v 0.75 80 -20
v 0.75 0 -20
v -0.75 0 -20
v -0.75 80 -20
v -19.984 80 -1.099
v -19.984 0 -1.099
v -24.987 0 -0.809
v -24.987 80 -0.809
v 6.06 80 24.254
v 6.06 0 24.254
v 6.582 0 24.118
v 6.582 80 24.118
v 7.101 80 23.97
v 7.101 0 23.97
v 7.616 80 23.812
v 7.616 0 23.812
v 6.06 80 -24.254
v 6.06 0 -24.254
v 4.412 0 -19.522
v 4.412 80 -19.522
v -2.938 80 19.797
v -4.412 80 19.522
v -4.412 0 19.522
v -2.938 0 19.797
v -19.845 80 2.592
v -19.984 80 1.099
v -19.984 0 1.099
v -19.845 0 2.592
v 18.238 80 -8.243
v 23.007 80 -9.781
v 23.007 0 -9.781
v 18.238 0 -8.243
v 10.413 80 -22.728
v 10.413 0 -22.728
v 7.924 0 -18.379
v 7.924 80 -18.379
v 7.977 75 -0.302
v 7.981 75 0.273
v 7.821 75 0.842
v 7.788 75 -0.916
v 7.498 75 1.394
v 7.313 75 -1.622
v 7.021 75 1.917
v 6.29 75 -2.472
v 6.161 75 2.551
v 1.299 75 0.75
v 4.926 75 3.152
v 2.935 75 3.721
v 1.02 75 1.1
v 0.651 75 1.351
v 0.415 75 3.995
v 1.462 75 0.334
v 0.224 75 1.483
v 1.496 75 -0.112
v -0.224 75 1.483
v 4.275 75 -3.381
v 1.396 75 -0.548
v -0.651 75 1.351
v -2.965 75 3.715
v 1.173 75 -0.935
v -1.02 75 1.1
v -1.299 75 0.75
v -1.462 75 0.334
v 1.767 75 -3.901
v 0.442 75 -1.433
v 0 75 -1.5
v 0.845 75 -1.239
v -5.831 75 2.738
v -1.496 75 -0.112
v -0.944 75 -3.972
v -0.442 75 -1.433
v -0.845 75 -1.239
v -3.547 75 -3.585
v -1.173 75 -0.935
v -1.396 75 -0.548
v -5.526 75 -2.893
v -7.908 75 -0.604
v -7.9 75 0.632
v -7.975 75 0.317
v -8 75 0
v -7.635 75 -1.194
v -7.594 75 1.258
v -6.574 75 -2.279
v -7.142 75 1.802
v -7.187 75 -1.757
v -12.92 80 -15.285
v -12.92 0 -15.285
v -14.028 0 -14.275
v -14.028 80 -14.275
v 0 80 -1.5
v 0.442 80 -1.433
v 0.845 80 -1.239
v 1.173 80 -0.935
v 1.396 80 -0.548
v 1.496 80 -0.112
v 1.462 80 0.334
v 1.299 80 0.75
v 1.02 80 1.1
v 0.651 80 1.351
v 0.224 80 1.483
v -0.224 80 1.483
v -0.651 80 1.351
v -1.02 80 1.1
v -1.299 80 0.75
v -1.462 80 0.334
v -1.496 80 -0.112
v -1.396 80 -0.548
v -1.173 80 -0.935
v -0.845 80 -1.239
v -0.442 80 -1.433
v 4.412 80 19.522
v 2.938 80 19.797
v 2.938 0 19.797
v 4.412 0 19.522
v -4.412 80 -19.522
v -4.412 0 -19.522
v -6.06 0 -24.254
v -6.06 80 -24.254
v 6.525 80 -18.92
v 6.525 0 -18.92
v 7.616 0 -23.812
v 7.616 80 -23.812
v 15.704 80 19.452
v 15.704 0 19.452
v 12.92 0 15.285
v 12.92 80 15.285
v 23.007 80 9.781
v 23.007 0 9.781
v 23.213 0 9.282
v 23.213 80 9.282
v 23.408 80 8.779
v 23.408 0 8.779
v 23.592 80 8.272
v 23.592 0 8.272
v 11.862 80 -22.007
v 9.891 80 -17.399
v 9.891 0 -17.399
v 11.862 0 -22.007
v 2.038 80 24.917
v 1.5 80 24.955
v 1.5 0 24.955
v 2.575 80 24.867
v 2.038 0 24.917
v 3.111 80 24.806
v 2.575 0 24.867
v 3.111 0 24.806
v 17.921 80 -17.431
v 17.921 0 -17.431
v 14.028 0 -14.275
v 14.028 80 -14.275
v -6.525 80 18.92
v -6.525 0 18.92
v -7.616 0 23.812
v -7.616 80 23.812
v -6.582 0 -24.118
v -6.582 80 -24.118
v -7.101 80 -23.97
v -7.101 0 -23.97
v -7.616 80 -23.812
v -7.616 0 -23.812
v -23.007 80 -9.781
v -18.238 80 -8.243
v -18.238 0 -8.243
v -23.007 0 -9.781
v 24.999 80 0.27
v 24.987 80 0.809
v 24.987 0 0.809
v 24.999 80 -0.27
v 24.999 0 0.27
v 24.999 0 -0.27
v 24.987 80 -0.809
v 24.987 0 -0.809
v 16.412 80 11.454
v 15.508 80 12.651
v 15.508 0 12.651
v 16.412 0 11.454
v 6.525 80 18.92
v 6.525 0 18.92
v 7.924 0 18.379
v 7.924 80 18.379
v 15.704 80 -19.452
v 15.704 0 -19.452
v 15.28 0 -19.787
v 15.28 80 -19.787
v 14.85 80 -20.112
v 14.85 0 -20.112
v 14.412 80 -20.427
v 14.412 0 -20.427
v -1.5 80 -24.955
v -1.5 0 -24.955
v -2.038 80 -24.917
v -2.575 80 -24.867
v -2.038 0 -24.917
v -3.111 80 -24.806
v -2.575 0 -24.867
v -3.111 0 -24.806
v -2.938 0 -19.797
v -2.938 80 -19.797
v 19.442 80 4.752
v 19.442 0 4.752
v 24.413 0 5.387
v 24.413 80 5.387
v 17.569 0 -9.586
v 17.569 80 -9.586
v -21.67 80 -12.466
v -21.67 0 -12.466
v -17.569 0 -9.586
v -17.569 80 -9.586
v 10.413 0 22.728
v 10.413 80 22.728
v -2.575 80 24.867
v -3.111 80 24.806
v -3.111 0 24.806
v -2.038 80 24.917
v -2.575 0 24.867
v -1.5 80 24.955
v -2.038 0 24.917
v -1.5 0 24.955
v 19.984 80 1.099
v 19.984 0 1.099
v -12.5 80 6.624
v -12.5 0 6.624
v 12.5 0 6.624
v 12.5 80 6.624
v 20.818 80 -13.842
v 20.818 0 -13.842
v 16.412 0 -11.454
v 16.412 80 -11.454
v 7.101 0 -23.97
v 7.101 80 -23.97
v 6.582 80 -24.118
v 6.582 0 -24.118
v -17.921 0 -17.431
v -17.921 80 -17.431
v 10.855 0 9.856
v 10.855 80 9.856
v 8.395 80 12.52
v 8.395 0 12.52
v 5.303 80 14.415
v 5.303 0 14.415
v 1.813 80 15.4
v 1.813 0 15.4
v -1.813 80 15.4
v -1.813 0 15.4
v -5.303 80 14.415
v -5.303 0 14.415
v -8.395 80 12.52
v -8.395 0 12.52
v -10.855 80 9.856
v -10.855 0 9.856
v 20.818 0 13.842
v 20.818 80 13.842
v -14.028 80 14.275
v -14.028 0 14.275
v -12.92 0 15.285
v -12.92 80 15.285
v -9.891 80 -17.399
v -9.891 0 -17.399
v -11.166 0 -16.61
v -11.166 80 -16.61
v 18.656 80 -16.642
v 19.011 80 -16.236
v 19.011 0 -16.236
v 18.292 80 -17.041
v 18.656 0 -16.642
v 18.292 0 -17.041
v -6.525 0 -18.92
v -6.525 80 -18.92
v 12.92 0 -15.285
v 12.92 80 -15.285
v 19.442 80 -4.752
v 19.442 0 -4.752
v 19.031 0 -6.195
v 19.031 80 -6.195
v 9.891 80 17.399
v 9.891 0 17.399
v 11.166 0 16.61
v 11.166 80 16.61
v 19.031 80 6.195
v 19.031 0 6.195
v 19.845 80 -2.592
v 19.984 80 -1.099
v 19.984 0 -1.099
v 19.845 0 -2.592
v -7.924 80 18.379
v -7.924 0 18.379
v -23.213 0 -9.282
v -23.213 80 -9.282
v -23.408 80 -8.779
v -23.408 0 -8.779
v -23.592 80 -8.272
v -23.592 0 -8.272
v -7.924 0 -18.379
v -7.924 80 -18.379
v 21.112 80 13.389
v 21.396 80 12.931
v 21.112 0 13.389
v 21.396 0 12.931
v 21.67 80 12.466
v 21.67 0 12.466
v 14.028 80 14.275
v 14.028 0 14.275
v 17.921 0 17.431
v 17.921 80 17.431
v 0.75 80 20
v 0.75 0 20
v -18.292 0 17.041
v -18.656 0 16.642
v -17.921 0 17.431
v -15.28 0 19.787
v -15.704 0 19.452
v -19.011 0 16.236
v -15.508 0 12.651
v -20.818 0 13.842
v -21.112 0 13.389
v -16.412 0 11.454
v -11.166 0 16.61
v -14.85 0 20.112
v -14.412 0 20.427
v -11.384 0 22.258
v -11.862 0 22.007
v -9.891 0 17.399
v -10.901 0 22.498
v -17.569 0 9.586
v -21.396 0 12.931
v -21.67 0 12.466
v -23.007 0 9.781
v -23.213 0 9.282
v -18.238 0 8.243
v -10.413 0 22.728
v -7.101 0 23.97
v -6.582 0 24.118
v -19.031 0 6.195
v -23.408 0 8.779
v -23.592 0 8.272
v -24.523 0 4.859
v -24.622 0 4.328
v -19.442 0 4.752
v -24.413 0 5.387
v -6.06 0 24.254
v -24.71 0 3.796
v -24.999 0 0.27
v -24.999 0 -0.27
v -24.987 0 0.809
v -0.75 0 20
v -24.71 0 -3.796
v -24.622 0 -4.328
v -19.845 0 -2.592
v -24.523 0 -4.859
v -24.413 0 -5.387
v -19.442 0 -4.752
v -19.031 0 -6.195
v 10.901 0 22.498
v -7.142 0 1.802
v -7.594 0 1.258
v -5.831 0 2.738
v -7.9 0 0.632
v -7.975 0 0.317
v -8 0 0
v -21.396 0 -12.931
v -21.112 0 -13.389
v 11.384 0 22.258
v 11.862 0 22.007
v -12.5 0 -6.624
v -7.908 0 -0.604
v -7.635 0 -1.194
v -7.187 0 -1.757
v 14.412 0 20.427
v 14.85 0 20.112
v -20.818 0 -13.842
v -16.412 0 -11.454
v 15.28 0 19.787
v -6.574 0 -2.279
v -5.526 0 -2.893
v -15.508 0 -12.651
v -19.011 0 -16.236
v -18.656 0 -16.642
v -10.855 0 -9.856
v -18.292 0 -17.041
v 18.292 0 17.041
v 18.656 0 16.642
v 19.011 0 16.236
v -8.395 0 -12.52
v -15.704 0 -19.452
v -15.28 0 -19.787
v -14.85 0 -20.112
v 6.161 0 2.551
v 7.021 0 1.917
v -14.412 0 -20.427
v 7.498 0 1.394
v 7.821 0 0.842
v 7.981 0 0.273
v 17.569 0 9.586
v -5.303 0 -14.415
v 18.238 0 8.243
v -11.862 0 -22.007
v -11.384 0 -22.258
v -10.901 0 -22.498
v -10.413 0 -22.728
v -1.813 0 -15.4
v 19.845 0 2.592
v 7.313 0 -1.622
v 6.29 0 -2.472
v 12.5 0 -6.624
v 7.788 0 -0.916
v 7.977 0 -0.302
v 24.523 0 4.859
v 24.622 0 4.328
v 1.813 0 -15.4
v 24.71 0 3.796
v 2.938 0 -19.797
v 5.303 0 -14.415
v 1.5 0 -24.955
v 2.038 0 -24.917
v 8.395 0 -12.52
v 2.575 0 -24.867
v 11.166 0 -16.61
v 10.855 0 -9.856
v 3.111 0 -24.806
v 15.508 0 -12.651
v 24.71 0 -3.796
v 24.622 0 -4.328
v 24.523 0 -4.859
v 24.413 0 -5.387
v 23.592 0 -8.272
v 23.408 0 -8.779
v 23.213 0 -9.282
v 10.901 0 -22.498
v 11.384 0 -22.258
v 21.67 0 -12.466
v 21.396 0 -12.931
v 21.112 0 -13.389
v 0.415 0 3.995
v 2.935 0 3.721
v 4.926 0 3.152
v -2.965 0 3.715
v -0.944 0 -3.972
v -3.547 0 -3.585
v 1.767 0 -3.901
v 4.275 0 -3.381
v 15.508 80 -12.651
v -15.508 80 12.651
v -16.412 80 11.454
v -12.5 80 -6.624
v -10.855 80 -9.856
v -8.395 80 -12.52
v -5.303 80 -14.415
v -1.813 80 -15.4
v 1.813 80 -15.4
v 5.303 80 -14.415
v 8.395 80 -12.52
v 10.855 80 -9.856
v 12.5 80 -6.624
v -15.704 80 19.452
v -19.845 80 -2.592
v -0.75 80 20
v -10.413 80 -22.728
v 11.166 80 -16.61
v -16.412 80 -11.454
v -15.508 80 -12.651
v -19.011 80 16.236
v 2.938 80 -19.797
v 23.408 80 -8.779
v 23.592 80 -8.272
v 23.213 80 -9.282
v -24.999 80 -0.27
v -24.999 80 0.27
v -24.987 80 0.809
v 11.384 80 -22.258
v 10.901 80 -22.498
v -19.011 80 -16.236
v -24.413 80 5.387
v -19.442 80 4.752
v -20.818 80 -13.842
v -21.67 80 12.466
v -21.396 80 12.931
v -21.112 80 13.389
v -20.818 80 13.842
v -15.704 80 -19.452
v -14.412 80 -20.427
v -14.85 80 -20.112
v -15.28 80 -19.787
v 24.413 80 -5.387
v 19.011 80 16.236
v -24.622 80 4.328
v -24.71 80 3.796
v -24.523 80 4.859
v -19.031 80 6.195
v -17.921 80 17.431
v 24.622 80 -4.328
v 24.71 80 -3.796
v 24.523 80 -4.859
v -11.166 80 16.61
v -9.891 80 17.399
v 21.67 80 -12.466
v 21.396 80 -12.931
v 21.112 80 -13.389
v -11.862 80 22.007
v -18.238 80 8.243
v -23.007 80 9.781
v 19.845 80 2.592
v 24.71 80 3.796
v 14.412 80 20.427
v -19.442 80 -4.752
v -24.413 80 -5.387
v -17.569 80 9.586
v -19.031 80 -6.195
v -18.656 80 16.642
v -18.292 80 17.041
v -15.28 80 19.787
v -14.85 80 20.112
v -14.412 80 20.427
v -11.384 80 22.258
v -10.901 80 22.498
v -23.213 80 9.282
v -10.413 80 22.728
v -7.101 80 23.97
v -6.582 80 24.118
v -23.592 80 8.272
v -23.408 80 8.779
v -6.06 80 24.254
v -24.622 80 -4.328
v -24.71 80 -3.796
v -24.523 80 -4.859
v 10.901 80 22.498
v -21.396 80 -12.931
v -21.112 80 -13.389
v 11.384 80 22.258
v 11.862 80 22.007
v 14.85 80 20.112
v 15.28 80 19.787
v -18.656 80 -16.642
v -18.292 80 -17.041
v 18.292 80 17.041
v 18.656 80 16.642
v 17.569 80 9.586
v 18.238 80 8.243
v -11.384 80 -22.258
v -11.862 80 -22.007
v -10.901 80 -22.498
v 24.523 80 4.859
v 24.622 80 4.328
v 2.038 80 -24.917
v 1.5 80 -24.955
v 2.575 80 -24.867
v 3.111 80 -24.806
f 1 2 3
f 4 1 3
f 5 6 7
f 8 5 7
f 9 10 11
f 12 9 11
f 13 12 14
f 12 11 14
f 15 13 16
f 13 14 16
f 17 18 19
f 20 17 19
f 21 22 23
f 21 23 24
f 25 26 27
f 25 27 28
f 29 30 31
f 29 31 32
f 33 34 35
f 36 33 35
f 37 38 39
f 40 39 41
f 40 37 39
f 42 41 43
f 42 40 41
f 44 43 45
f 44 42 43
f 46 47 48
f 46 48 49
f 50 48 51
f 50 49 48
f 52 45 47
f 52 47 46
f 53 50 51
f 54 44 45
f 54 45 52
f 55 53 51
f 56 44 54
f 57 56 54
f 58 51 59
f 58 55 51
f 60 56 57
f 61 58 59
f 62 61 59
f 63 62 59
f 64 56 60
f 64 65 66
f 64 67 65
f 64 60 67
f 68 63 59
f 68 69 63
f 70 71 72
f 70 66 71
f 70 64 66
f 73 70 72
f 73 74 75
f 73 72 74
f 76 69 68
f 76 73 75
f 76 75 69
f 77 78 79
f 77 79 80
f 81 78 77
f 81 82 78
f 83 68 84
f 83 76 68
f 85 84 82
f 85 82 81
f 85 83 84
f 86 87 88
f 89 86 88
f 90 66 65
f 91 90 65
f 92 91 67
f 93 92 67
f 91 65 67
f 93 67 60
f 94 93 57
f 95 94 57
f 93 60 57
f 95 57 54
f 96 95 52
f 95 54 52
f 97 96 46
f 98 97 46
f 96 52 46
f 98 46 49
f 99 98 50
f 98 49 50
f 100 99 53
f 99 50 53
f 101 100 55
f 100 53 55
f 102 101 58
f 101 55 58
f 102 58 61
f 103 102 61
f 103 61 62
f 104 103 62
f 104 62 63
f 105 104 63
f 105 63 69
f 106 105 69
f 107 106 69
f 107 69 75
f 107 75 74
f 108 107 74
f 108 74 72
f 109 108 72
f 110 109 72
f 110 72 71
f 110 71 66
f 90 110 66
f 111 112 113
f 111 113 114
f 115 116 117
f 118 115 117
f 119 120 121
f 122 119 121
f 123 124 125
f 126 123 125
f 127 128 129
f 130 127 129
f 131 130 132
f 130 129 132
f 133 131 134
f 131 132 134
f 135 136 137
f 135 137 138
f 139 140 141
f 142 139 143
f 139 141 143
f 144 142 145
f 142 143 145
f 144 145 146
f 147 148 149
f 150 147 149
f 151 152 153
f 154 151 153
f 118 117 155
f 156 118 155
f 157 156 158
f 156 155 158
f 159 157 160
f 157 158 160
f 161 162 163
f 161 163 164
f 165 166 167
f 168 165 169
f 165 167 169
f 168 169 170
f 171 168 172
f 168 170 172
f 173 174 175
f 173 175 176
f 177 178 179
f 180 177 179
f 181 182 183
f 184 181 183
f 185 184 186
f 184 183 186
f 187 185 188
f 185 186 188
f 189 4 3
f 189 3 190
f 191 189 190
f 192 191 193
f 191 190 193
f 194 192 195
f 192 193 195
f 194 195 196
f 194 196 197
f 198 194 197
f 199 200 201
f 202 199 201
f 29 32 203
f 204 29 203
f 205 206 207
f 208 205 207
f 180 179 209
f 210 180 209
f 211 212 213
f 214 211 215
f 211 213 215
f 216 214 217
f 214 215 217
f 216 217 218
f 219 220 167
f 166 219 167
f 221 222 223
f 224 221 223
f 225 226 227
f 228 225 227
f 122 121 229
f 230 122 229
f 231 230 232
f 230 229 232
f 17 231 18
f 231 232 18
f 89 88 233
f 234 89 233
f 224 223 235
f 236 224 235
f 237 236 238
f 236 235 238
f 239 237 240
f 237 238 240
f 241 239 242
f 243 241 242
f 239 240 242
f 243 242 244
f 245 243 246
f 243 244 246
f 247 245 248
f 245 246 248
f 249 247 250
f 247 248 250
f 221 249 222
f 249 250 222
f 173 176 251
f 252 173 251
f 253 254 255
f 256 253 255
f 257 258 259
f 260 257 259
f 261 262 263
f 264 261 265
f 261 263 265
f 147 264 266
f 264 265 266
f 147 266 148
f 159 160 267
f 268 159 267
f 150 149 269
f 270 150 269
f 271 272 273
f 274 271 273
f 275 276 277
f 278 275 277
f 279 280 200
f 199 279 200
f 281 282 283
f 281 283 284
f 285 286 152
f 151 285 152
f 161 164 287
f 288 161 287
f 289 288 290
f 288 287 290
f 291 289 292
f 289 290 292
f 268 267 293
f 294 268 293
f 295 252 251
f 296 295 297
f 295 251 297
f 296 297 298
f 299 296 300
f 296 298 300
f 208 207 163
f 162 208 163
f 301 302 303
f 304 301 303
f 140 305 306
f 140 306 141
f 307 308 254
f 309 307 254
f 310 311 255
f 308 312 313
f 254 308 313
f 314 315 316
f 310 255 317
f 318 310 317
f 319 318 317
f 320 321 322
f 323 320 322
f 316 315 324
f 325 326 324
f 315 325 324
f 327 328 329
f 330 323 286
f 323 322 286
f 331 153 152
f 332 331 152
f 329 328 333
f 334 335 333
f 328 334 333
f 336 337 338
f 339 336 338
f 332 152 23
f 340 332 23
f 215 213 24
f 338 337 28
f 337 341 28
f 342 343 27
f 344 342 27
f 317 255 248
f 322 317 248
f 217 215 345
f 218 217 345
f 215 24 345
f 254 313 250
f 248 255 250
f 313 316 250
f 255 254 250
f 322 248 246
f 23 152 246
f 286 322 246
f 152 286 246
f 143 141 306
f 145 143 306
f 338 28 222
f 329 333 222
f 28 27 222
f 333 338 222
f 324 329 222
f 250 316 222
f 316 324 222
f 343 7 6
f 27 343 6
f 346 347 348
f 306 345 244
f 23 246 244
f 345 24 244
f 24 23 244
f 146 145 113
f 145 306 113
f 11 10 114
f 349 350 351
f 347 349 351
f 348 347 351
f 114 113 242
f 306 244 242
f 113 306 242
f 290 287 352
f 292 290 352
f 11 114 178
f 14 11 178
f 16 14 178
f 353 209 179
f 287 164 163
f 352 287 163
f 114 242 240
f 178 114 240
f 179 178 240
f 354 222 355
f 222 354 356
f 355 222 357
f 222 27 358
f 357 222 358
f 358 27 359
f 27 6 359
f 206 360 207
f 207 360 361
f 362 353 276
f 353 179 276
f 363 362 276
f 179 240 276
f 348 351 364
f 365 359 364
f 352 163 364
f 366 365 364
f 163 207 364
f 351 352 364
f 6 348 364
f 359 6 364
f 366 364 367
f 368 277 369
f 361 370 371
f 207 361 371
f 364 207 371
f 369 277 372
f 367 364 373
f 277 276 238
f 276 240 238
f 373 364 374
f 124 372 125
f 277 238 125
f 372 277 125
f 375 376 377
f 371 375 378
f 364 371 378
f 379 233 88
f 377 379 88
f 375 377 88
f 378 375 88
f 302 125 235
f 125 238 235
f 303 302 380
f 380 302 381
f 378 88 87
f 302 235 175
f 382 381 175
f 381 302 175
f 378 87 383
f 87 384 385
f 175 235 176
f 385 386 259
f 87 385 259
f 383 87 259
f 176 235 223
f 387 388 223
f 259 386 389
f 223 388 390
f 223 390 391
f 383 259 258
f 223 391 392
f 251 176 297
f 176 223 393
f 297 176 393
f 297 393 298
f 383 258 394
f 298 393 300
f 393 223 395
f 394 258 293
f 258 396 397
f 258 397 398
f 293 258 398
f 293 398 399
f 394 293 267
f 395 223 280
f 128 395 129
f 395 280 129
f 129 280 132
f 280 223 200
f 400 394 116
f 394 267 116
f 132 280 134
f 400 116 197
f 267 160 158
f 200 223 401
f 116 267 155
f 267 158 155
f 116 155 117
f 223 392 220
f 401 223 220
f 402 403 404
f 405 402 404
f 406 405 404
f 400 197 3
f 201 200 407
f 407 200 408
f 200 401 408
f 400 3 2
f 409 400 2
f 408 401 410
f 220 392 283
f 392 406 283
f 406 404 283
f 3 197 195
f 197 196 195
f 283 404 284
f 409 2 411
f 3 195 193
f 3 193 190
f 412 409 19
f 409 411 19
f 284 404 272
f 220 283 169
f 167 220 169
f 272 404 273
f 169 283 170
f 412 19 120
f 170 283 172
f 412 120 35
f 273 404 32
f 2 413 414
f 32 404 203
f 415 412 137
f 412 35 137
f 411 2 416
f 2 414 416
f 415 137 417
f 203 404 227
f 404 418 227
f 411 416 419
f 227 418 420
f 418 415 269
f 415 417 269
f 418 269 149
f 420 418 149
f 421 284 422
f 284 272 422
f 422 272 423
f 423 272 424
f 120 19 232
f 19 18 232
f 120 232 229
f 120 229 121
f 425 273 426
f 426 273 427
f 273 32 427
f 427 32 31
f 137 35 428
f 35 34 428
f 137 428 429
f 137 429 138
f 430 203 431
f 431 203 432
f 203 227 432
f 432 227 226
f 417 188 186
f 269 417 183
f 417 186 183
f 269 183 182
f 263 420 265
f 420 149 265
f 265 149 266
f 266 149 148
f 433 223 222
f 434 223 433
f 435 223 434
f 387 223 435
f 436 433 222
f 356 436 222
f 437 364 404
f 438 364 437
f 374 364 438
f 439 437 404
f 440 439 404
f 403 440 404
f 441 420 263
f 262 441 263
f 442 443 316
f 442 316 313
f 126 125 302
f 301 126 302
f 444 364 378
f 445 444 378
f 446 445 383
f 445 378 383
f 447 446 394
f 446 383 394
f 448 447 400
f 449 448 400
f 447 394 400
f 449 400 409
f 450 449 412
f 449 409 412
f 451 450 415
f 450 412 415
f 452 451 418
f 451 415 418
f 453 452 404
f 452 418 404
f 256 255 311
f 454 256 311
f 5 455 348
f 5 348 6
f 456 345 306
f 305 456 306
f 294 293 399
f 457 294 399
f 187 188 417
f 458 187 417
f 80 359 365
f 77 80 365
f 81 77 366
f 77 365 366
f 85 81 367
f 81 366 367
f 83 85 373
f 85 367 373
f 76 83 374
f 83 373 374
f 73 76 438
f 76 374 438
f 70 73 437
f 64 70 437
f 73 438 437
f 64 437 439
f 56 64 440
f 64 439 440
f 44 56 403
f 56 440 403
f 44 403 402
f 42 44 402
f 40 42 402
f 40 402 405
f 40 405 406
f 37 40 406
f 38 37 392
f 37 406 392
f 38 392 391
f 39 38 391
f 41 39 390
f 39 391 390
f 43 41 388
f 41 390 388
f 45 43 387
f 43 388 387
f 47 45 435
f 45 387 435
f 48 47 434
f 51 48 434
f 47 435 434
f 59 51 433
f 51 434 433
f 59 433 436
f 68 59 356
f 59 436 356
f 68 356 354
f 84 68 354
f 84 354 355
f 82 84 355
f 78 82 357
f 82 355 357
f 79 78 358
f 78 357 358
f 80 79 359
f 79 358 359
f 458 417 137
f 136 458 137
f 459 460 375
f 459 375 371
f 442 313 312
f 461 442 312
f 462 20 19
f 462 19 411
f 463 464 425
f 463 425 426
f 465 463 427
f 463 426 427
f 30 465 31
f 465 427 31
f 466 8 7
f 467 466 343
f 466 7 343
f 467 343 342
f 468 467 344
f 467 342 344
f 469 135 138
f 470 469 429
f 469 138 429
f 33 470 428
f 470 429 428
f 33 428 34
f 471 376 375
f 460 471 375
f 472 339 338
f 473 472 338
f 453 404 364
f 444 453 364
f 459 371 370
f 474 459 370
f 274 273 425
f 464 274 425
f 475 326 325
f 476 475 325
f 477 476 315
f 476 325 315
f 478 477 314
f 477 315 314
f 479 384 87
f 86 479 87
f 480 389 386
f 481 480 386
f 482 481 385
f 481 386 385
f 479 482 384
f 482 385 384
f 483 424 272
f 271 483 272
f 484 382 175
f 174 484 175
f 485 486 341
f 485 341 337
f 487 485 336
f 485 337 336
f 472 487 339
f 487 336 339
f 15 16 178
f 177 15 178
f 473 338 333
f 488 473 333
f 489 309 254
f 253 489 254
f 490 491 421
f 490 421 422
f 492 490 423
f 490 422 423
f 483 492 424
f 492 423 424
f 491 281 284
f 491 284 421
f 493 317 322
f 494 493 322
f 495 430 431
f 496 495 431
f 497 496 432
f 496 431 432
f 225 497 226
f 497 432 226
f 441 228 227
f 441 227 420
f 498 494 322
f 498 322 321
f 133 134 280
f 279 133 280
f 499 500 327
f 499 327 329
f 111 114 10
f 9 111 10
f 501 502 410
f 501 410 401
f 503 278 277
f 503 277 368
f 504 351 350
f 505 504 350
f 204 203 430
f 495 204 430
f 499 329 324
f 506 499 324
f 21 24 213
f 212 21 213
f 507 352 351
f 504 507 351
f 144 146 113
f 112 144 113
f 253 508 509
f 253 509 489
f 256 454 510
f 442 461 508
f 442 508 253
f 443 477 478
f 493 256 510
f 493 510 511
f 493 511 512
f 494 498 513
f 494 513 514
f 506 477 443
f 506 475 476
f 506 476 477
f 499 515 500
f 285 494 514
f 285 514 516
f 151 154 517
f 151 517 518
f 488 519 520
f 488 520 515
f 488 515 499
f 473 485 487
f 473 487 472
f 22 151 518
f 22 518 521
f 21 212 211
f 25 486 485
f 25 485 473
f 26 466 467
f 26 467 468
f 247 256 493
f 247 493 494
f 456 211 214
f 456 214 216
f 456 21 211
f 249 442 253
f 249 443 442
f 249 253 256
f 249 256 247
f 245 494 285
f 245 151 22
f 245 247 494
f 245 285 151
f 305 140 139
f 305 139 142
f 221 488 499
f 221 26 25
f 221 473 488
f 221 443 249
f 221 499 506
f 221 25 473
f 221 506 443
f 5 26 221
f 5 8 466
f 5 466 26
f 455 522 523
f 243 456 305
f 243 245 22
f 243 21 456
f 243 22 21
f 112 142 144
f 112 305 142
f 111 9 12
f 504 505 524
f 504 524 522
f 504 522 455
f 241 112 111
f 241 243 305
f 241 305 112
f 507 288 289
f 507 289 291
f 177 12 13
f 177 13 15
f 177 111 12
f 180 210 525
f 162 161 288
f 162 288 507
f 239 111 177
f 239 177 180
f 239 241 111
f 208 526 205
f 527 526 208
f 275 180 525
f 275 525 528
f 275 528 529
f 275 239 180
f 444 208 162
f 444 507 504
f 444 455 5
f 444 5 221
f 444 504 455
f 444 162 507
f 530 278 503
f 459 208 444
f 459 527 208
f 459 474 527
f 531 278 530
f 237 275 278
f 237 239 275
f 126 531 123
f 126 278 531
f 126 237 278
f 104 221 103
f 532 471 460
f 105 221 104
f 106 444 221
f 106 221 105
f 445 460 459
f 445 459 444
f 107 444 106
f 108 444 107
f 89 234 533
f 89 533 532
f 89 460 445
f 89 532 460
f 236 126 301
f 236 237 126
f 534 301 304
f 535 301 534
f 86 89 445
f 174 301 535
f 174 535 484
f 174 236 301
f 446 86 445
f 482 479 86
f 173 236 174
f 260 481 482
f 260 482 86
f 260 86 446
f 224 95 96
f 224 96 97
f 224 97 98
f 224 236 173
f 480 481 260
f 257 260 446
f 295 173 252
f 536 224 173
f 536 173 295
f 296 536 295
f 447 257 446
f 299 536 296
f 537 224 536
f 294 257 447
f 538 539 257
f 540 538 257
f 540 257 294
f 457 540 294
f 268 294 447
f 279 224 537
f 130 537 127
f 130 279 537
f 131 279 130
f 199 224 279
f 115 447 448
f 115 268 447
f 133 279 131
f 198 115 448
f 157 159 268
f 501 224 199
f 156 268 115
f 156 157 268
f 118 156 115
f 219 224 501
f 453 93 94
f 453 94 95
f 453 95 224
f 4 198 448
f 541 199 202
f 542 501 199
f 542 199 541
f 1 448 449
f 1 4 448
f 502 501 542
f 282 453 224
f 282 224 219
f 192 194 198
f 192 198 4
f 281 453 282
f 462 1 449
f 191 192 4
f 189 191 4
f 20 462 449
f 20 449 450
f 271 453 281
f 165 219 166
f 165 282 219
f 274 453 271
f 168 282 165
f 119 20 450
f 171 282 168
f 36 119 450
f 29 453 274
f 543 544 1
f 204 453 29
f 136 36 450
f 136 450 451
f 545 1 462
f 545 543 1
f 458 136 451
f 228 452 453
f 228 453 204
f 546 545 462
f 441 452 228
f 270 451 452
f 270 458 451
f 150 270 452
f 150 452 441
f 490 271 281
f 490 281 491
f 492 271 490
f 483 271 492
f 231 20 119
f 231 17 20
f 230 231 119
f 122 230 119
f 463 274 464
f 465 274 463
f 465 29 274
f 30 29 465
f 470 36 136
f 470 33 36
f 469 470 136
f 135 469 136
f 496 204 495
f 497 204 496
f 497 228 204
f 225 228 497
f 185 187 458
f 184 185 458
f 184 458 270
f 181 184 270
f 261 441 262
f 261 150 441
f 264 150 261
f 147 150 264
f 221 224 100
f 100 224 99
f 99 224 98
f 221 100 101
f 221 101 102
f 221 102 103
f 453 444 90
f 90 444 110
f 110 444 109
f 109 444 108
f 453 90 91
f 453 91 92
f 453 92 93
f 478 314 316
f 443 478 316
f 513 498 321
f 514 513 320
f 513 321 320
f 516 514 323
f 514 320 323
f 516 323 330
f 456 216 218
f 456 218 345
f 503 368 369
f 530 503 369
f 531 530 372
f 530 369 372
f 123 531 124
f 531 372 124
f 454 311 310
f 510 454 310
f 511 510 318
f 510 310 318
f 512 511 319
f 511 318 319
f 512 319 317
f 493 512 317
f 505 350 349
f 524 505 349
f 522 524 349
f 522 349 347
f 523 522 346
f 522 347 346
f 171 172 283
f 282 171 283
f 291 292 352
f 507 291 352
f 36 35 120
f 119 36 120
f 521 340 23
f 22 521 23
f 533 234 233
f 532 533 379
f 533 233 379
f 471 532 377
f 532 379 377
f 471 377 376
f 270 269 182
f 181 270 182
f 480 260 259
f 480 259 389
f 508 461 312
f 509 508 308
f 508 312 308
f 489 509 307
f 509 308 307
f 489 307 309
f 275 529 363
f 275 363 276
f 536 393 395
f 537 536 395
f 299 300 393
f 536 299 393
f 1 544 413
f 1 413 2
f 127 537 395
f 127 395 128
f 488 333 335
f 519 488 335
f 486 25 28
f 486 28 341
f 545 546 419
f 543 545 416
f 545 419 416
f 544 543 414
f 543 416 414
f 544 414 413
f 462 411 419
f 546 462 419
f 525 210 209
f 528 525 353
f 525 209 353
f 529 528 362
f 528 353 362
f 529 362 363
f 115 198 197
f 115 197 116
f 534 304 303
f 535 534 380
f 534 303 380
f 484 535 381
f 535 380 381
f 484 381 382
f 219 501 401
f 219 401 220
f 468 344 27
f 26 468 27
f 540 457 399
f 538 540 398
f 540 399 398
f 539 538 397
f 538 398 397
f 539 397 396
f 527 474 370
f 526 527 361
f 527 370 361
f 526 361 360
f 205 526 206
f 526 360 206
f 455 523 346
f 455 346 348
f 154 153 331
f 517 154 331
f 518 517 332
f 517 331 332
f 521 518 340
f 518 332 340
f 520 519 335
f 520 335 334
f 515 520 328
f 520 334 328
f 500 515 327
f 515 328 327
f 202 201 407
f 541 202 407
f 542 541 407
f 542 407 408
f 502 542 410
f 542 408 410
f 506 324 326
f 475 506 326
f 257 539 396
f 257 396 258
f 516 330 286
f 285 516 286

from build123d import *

# Parameters (mm, degrees)
BOSS_EXTRUDE2_DEPTH = 80
CUT_EXTRUDE3_DEPTH  = 88.451415083
SKETCH6_RX          = 8
SKETCH6_RY          = 4
CUT_EXTRUDE4_DEPTH  = 75
SKETCH7_R           = 1.5
CUT_EXTRUDE5_DEPTH  = 83.902050638


# Read off the part's stored shape, not the designer's step: Boss-Extrude2
with BuildPart() as part:
    # Boss-Extrude2 outline → Boss-Extrude2 (new body)
    with BuildSketch(Plane(origin=(0, 0, 0), x_dir=(1, 0, 0), z_dir=(0, 1, 0))):
        with BuildLine():
            Line((1.5, 24.954959427), (0.75, 20))
            Line((0.75, 20), (-0.75, 20))
            Line((-0.75, 20), (-1.5, 24.954959427))
            ThreePointArc((-1.5, 24.954959427), (-2.306708986, 24.893354407), (-3.111002112, 24.805678097))
            Line((-3.111002112, 24.805678097), (-2.937760532, 19.797274132))
            Line((-2.937760532, 19.797274132), (-4.412220181, 19.521649855))
            Line((-4.412220181, 19.521649855), (-6.059921411, 24.254429544))
            ThreePointArc((-6.059921411, 24.254429544), (-6.841574752, 24.045641079), (-7.616062779, 23.811669151))
            Line((-7.616062779, 23.811669151), (-6.525479152, 18.920375838))
            Line((-6.525479152, 18.920375838), (-7.924187496, 18.378513338))
            Line((-7.924187496, 18.378513338), (-10.413479467, 22.727944152))
            ThreePointArc((-10.413479467, 22.727944152), (-11.143458894, 22.379082284), (-11.861767562, 22.006782371))
            Line((-11.861767562, 22.006782371), (-9.890980406, 17.399166837))
            Line((-9.890980406, 17.399166837), (-11.166306109, 16.609518592))
            Line((-11.166306109, 16.609518592), (-14.412418969, 20.427485882))
            ThreePointArc((-14.412418969, 20.427485882), (-15.065865909, 19.950430682), (-15.703534077, 19.452481011))
            Line((-15.703534077, 19.452481011), (-12.919656185, 15.285450077))
            Line((-12.919656185, 15.285450077), (-14.028169561, 14.274906612))
            Line((-14.028169561, 14.274906612), (-17.920560829, 17.43139408))
            ThreePointArc((-17.920560829, 17.43139408), (-18.475222931, 16.842391091), (-19.010535574, 16.235748741))
            Line((-19.010535574, 16.235748741), (-15.508368568, 12.651205648))
            Line((-15.508368568, 12.651205648), (-16.412320523, 11.454179807))
            Line((-16.412320523, 11.454179807), (-20.818439483, 13.841697059))
            ThreePointArc((-20.818439483, 13.841697059), (-21.255428393, 13.160804072), (-21.670156083, 12.46612752))
            Line((-21.670156083, 12.46612752), (-17.56896206, 9.586139584))
            Line((-17.56896206, 9.586139584), (-18.237569594, 8.243394647))
            Line((-18.237569594, 8.243394647), (-23.00737115, 9.780637646))
            ThreePointArc((-23.00737115, 9.780637646), (-23.311805735, 9.031041655), (-23.591825416, 8.271987279))
            Line((-23.591825416, 8.271987279), (-19.031265621, 6.194629034))
            Line((-19.031265621, 6.194629034), (-19.441760106, 4.751890569))
            Line((-19.441760106, 4.751890569), (-24.412814386, 5.386510349))
            ThreePointArc((-24.412814386, 5.386510349), (-24.574327492, 4.593737945), (-24.71010343, 3.796154431))
            Line((-24.71010343, 3.796154431), (-19.845482256, 2.592167821))
            Line((-19.845482256, 2.592167821), (-19.983884795, 1.098566557))
            Line((-19.983884795, 1.098566557), (-24.986908509, 0.808951902))
            ThreePointArc((-24.986908509, 0.808951902), (-25, 0), (-24.986908509, -0.808951902))
            Line((-24.986908509, -0.808951902), (-19.983884795, -1.098566557))
            Line((-19.983884795, -1.098566557), (-19.845482256, -2.592167821))
            Line((-19.845482256, -2.592167821), (-24.71010343, -3.796154431))
            ThreePointArc((-24.71010343, -3.796154431), (-24.574327492, -4.593737945), (-24.412814386, -5.386510349))
            Line((-24.412814386, -5.386510349), (-19.441760106, -4.751890569))
            Line((-19.441760106, -4.751890569), (-19.031265621, -6.194629034))
            Line((-19.031265621, -6.194629034), (-23.591825416, -8.271987279))
            ThreePointArc((-23.591825416, -8.271987279), (-23.311805735, -9.031041655), (-23.00737115, -9.780637646))
            Line((-23.00737115, -9.780637646), (-18.237569594, -8.243394647))
            Line((-18.237569594, -8.243394647), (-17.56896206, -9.586139584))
            Line((-17.56896206, -9.586139584), (-21.670156083, -12.46612752))
            ThreePointArc((-21.670156083, -12.46612752), (-21.255428393, -13.160804072), (-20.818439483, -13.841697059))
            Line((-20.818439483, -13.841697059), (-16.412320523, -11.454179807))
            Line((-16.412320523, -11.454179807), (-15.508368568, -12.651205648))
            Line((-15.508368568, -12.651205648), (-19.010535574, -16.235748741))
            ThreePointArc((-19.010535574, -16.235748741), (-18.475222931, -16.842391091), (-17.920560829, -17.43139408))
            Line((-17.920560829, -17.43139408), (-14.028169561, -14.274906612))
            Line((-14.028169561, -14.274906612), (-12.919656185, -15.285450077))
            Line((-12.919656185, -15.285450077), (-15.703534077, -19.452481011))
            ThreePointArc((-15.703534077, -19.452481011), (-15.065865909, -19.950430682), (-14.412418969, -20.427485882))
            Line((-14.412418969, -20.427485882), (-11.166306109, -16.609518592))
            Line((-11.166306109, -16.609518592), (-9.890980406, -17.399166837))
            Line((-9.890980406, -17.399166837), (-11.861767562, -22.006782371))
            ThreePointArc((-11.861767562, -22.006782371), (-11.143458894, -22.379082284), (-10.413479467, -22.727944152))
            Line((-10.413479467, -22.727944152), (-7.924187496, -18.378513338))
            Line((-7.924187496, -18.378513338), (-6.525479152, -18.920375838))
            Line((-6.525479152, -18.920375838), (-7.616062779, -23.811669151))
            ThreePointArc((-7.616062779, -23.811669151), (-6.841574752, -24.045641079), (-6.059921411, -24.254429544))
            Line((-6.059921411, -24.254429544), (-4.412220181, -19.521649855))
            Line((-4.412220181, -19.521649855), (-2.937760532, -19.797274132))
            Line((-2.937760532, -19.797274132), (-3.111002112, -24.805678097))
            ThreePointArc((-3.111002112, -24.805678097), (-2.306708986, -24.893354407), (-1.5, -24.954959427))
            Line((-1.5, -24.954959427), (-0.75, -20))
            Line((-0.75, -20), (0.75, -20))
            Line((0.75, -20), (1.5, -24.954959427))
            ThreePointArc((1.5, -24.954959427), (2.306708986, -24.893354407), (3.111002112, -24.805678097))
            Line((3.111002112, -24.805678097), (2.937760532, -19.797274132))
            Line((2.937760532, -19.797274132), (4.412220181, -19.521649855))
            Line((4.412220181, -19.521649855), (6.059921411, -24.254429544))
            ThreePointArc((6.059921411, -24.254429544), (6.841574752, -24.045641079), (7.616062779, -23.811669151))
            Line((7.616062779, -23.811669151), (6.525479152, -18.920375838))
            Line((6.525479152, -18.920375838), (7.924187496, -18.378513338))
            Line((7.924187496, -18.378513338), (10.413479467, -22.727944152))
            ThreePointArc((10.413479467, -22.727944152), (11.143458894, -22.379082284), (11.861767562, -22.006782371))
            Line((11.861767562, -22.006782371), (9.890980406, -17.399166837))
            Line((9.890980406, -17.399166837), (11.166306109, -16.609518592))
            Line((11.166306109, -16.609518592), (14.412418969, -20.427485882))
            ThreePointArc((14.412418969, -20.427485882), (15.065865909, -19.950430682), (15.703534077, -19.452481011))
            Line((15.703534077, -19.452481011), (12.919656185, -15.285450077))
            Line((12.919656185, -15.285450077), (14.028169561, -14.274906612))
            Line((14.028169561, -14.274906612), (17.920560829, -17.43139408))
            ThreePointArc((17.920560829, -17.43139408), (18.475222931, -16.842391091), (19.010535574, -16.235748741))
            Line((19.010535574, -16.235748741), (15.508368568, -12.651205648))
            Line((15.508368568, -12.651205648), (16.412320523, -11.454179807))
            Line((16.412320523, -11.454179807), (20.818439483, -13.841697059))
            ThreePointArc((20.818439483, -13.841697059), (21.255428393, -13.160804072), (21.670156083, -12.46612752))
            Line((21.670156083, -12.46612752), (17.56896206, -9.586139584))
            Line((17.56896206, -9.586139584), (18.237569594, -8.243394647))
            Line((18.237569594, -8.243394647), (23.00737115, -9.780637646))
            ThreePointArc((23.00737115, -9.780637646), (23.311805735, -9.031041655), (23.591825416, -8.271987279))
            Line((23.591825416, -8.271987279), (19.031265621, -6.194629034))
            Line((19.031265621, -6.194629034), (19.441760106, -4.751890569))
            Line((19.441760106, -4.751890569), (24.412814386, -5.386510349))
            ThreePointArc((24.412814386, -5.386510349), (24.574327492, -4.593737945), (24.71010343, -3.796154431))
            Line((24.71010343, -3.796154431), (19.845482256, -2.592167821))
            Line((19.845482256, -2.592167821), (19.983884796, -1.098566557))
            Line((19.983884796, -1.098566557), (24.986908509, -0.808951902))
            ThreePointArc((24.986908509, -0.808951902), (25, 0), (24.986908509, 0.808951902))
            Line((24.986908509, 0.808951902), (19.983884796, 1.098566557))
            Line((19.983884796, 1.098566557), (19.845482256, 2.592167821))
            Line((19.845482256, 2.592167821), (24.71010343, 3.796154431))
            ThreePointArc((24.71010343, 3.796154431), (24.574327492, 4.593737945), (24.412814386, 5.386510349))
            Line((24.412814386, 5.386510349), (19.441760106, 4.751890569))
            Line((19.441760106, 4.751890569), (19.031265621, 6.194629034))
            Line((19.031265621, 6.194629034), (23.591825416, 8.271987279))
            ThreePointArc((23.591825416, 8.271987279), (23.311805735, 9.031041655), (23.00737115, 9.780637646))
            Line((23.00737115, 9.780637646), (18.237569594, 8.243394647))
            Line((18.237569594, 8.243394647), (17.56896206, 9.586139584))
            Line((17.56896206, 9.586139584), (21.670156083, 12.46612752))
            ThreePointArc((21.670156083, 12.46612752), (21.255428393, 13.160804072), (20.818439483, 13.841697059))
            Line((20.818439483, 13.841697059), (16.412320523, 11.454179807))
            Line((16.412320523, 11.454179807), (15.508368568, 12.651205648))
            Line((15.508368568, 12.651205648), (19.010535574, 16.235748741))
            ThreePointArc((19.010535574, 16.235748741), (18.475222931, 16.842391091), (17.920560829, 17.43139408))
            Line((17.920560829, 17.43139408), (14.028169561, 14.274906612))
            Line((14.028169561, 14.274906612), (12.919656185, 15.285450077))
            Line((12.919656185, 15.285450077), (15.703534077, 19.452481011))
            ThreePointArc((15.703534077, 19.452481011), (15.065865909, 19.950430682), (14.412418969, 20.427485882))
            Line((14.412418969, 20.427485882), (11.166306109, 16.609518592))
            Line((11.166306109, 16.609518592), (9.890980406, 17.399166837))
            Line((9.890980406, 17.399166837), (11.861767562, 22.006782371))
            ThreePointArc((11.861767562, 22.006782371), (11.143458894, 22.379082284), (10.413479467, 22.727944152))
            Line((10.413479467, 22.727944152), (7.924187496, 18.378513338))
            Line((7.924187496, 18.378513338), (6.525479152, 18.920375838))
            Line((6.525479152, 18.920375838), (7.616062779, 23.811669151))
            ThreePointArc((7.616062779, 23.811669151), (6.841574752, 24.045641079), (6.059921411, 24.254429544))
            Line((6.059921411, 24.254429544), (4.412220181, 19.521649855))
            Line((4.412220181, 19.521649855), (2.937760532, 19.797274132))
            Line((2.937760532, 19.797274132), (3.111002112, 24.805678097))
            ThreePointArc((3.111002112, 24.805678097), (2.306708986, 24.893354407), (1.5, 24.954959427))
        make_face()
    extrude(amount=BOSS_EXTRUDE2_DEPTH)

    # Sketch5 → Cut-Extrude3 (cut, through all)
    with BuildSketch(Plane.XZ):
        with BuildLine():
            Line((-12.5, 6.623664739), (12.5, 6.623664739))
            ThreePointArc((12.5, 6.623664739), (0, 15.524722913), (-12.5, 6.623664739))
        make_face()
        with BuildLine():
            Line((12.5, -6.623664739), (-12.5, -6.623664739))
            ThreePointArc((-12.5, -6.623664739), (0, -15.524722913), (12.5, -6.623664739))
        make_face()
    extrude(amount=-CUT_EXTRUDE3_DEPTH, mode=Mode.SUBTRACT)

    # Sketch6 → Cut-Extrude4 (cut)
    with BuildSketch(Plane(origin=(0, 0, 0), x_dir=(-1, 0, 0), z_dir=(0, -1, 0))):
        with Locations((0, 0)):
            Ellipse(SKETCH6_RX, SKETCH6_RY)
    extrude(amount=-CUT_EXTRUDE4_DEPTH, mode=Mode.SUBTRACT)

    # Sketch7 → Cut-Extrude5 (cut, through all)
    with BuildSketch(Plane.XZ.offset(-75)):
        with Locations(Location((0, 0, 0), (0, 0, 270))):
            Circle(SKETCH7_R)
    extrude(amount=-CUT_EXTRUDE5_DEPTH, mode=Mode.SUBTRACT)


solid = part.part
